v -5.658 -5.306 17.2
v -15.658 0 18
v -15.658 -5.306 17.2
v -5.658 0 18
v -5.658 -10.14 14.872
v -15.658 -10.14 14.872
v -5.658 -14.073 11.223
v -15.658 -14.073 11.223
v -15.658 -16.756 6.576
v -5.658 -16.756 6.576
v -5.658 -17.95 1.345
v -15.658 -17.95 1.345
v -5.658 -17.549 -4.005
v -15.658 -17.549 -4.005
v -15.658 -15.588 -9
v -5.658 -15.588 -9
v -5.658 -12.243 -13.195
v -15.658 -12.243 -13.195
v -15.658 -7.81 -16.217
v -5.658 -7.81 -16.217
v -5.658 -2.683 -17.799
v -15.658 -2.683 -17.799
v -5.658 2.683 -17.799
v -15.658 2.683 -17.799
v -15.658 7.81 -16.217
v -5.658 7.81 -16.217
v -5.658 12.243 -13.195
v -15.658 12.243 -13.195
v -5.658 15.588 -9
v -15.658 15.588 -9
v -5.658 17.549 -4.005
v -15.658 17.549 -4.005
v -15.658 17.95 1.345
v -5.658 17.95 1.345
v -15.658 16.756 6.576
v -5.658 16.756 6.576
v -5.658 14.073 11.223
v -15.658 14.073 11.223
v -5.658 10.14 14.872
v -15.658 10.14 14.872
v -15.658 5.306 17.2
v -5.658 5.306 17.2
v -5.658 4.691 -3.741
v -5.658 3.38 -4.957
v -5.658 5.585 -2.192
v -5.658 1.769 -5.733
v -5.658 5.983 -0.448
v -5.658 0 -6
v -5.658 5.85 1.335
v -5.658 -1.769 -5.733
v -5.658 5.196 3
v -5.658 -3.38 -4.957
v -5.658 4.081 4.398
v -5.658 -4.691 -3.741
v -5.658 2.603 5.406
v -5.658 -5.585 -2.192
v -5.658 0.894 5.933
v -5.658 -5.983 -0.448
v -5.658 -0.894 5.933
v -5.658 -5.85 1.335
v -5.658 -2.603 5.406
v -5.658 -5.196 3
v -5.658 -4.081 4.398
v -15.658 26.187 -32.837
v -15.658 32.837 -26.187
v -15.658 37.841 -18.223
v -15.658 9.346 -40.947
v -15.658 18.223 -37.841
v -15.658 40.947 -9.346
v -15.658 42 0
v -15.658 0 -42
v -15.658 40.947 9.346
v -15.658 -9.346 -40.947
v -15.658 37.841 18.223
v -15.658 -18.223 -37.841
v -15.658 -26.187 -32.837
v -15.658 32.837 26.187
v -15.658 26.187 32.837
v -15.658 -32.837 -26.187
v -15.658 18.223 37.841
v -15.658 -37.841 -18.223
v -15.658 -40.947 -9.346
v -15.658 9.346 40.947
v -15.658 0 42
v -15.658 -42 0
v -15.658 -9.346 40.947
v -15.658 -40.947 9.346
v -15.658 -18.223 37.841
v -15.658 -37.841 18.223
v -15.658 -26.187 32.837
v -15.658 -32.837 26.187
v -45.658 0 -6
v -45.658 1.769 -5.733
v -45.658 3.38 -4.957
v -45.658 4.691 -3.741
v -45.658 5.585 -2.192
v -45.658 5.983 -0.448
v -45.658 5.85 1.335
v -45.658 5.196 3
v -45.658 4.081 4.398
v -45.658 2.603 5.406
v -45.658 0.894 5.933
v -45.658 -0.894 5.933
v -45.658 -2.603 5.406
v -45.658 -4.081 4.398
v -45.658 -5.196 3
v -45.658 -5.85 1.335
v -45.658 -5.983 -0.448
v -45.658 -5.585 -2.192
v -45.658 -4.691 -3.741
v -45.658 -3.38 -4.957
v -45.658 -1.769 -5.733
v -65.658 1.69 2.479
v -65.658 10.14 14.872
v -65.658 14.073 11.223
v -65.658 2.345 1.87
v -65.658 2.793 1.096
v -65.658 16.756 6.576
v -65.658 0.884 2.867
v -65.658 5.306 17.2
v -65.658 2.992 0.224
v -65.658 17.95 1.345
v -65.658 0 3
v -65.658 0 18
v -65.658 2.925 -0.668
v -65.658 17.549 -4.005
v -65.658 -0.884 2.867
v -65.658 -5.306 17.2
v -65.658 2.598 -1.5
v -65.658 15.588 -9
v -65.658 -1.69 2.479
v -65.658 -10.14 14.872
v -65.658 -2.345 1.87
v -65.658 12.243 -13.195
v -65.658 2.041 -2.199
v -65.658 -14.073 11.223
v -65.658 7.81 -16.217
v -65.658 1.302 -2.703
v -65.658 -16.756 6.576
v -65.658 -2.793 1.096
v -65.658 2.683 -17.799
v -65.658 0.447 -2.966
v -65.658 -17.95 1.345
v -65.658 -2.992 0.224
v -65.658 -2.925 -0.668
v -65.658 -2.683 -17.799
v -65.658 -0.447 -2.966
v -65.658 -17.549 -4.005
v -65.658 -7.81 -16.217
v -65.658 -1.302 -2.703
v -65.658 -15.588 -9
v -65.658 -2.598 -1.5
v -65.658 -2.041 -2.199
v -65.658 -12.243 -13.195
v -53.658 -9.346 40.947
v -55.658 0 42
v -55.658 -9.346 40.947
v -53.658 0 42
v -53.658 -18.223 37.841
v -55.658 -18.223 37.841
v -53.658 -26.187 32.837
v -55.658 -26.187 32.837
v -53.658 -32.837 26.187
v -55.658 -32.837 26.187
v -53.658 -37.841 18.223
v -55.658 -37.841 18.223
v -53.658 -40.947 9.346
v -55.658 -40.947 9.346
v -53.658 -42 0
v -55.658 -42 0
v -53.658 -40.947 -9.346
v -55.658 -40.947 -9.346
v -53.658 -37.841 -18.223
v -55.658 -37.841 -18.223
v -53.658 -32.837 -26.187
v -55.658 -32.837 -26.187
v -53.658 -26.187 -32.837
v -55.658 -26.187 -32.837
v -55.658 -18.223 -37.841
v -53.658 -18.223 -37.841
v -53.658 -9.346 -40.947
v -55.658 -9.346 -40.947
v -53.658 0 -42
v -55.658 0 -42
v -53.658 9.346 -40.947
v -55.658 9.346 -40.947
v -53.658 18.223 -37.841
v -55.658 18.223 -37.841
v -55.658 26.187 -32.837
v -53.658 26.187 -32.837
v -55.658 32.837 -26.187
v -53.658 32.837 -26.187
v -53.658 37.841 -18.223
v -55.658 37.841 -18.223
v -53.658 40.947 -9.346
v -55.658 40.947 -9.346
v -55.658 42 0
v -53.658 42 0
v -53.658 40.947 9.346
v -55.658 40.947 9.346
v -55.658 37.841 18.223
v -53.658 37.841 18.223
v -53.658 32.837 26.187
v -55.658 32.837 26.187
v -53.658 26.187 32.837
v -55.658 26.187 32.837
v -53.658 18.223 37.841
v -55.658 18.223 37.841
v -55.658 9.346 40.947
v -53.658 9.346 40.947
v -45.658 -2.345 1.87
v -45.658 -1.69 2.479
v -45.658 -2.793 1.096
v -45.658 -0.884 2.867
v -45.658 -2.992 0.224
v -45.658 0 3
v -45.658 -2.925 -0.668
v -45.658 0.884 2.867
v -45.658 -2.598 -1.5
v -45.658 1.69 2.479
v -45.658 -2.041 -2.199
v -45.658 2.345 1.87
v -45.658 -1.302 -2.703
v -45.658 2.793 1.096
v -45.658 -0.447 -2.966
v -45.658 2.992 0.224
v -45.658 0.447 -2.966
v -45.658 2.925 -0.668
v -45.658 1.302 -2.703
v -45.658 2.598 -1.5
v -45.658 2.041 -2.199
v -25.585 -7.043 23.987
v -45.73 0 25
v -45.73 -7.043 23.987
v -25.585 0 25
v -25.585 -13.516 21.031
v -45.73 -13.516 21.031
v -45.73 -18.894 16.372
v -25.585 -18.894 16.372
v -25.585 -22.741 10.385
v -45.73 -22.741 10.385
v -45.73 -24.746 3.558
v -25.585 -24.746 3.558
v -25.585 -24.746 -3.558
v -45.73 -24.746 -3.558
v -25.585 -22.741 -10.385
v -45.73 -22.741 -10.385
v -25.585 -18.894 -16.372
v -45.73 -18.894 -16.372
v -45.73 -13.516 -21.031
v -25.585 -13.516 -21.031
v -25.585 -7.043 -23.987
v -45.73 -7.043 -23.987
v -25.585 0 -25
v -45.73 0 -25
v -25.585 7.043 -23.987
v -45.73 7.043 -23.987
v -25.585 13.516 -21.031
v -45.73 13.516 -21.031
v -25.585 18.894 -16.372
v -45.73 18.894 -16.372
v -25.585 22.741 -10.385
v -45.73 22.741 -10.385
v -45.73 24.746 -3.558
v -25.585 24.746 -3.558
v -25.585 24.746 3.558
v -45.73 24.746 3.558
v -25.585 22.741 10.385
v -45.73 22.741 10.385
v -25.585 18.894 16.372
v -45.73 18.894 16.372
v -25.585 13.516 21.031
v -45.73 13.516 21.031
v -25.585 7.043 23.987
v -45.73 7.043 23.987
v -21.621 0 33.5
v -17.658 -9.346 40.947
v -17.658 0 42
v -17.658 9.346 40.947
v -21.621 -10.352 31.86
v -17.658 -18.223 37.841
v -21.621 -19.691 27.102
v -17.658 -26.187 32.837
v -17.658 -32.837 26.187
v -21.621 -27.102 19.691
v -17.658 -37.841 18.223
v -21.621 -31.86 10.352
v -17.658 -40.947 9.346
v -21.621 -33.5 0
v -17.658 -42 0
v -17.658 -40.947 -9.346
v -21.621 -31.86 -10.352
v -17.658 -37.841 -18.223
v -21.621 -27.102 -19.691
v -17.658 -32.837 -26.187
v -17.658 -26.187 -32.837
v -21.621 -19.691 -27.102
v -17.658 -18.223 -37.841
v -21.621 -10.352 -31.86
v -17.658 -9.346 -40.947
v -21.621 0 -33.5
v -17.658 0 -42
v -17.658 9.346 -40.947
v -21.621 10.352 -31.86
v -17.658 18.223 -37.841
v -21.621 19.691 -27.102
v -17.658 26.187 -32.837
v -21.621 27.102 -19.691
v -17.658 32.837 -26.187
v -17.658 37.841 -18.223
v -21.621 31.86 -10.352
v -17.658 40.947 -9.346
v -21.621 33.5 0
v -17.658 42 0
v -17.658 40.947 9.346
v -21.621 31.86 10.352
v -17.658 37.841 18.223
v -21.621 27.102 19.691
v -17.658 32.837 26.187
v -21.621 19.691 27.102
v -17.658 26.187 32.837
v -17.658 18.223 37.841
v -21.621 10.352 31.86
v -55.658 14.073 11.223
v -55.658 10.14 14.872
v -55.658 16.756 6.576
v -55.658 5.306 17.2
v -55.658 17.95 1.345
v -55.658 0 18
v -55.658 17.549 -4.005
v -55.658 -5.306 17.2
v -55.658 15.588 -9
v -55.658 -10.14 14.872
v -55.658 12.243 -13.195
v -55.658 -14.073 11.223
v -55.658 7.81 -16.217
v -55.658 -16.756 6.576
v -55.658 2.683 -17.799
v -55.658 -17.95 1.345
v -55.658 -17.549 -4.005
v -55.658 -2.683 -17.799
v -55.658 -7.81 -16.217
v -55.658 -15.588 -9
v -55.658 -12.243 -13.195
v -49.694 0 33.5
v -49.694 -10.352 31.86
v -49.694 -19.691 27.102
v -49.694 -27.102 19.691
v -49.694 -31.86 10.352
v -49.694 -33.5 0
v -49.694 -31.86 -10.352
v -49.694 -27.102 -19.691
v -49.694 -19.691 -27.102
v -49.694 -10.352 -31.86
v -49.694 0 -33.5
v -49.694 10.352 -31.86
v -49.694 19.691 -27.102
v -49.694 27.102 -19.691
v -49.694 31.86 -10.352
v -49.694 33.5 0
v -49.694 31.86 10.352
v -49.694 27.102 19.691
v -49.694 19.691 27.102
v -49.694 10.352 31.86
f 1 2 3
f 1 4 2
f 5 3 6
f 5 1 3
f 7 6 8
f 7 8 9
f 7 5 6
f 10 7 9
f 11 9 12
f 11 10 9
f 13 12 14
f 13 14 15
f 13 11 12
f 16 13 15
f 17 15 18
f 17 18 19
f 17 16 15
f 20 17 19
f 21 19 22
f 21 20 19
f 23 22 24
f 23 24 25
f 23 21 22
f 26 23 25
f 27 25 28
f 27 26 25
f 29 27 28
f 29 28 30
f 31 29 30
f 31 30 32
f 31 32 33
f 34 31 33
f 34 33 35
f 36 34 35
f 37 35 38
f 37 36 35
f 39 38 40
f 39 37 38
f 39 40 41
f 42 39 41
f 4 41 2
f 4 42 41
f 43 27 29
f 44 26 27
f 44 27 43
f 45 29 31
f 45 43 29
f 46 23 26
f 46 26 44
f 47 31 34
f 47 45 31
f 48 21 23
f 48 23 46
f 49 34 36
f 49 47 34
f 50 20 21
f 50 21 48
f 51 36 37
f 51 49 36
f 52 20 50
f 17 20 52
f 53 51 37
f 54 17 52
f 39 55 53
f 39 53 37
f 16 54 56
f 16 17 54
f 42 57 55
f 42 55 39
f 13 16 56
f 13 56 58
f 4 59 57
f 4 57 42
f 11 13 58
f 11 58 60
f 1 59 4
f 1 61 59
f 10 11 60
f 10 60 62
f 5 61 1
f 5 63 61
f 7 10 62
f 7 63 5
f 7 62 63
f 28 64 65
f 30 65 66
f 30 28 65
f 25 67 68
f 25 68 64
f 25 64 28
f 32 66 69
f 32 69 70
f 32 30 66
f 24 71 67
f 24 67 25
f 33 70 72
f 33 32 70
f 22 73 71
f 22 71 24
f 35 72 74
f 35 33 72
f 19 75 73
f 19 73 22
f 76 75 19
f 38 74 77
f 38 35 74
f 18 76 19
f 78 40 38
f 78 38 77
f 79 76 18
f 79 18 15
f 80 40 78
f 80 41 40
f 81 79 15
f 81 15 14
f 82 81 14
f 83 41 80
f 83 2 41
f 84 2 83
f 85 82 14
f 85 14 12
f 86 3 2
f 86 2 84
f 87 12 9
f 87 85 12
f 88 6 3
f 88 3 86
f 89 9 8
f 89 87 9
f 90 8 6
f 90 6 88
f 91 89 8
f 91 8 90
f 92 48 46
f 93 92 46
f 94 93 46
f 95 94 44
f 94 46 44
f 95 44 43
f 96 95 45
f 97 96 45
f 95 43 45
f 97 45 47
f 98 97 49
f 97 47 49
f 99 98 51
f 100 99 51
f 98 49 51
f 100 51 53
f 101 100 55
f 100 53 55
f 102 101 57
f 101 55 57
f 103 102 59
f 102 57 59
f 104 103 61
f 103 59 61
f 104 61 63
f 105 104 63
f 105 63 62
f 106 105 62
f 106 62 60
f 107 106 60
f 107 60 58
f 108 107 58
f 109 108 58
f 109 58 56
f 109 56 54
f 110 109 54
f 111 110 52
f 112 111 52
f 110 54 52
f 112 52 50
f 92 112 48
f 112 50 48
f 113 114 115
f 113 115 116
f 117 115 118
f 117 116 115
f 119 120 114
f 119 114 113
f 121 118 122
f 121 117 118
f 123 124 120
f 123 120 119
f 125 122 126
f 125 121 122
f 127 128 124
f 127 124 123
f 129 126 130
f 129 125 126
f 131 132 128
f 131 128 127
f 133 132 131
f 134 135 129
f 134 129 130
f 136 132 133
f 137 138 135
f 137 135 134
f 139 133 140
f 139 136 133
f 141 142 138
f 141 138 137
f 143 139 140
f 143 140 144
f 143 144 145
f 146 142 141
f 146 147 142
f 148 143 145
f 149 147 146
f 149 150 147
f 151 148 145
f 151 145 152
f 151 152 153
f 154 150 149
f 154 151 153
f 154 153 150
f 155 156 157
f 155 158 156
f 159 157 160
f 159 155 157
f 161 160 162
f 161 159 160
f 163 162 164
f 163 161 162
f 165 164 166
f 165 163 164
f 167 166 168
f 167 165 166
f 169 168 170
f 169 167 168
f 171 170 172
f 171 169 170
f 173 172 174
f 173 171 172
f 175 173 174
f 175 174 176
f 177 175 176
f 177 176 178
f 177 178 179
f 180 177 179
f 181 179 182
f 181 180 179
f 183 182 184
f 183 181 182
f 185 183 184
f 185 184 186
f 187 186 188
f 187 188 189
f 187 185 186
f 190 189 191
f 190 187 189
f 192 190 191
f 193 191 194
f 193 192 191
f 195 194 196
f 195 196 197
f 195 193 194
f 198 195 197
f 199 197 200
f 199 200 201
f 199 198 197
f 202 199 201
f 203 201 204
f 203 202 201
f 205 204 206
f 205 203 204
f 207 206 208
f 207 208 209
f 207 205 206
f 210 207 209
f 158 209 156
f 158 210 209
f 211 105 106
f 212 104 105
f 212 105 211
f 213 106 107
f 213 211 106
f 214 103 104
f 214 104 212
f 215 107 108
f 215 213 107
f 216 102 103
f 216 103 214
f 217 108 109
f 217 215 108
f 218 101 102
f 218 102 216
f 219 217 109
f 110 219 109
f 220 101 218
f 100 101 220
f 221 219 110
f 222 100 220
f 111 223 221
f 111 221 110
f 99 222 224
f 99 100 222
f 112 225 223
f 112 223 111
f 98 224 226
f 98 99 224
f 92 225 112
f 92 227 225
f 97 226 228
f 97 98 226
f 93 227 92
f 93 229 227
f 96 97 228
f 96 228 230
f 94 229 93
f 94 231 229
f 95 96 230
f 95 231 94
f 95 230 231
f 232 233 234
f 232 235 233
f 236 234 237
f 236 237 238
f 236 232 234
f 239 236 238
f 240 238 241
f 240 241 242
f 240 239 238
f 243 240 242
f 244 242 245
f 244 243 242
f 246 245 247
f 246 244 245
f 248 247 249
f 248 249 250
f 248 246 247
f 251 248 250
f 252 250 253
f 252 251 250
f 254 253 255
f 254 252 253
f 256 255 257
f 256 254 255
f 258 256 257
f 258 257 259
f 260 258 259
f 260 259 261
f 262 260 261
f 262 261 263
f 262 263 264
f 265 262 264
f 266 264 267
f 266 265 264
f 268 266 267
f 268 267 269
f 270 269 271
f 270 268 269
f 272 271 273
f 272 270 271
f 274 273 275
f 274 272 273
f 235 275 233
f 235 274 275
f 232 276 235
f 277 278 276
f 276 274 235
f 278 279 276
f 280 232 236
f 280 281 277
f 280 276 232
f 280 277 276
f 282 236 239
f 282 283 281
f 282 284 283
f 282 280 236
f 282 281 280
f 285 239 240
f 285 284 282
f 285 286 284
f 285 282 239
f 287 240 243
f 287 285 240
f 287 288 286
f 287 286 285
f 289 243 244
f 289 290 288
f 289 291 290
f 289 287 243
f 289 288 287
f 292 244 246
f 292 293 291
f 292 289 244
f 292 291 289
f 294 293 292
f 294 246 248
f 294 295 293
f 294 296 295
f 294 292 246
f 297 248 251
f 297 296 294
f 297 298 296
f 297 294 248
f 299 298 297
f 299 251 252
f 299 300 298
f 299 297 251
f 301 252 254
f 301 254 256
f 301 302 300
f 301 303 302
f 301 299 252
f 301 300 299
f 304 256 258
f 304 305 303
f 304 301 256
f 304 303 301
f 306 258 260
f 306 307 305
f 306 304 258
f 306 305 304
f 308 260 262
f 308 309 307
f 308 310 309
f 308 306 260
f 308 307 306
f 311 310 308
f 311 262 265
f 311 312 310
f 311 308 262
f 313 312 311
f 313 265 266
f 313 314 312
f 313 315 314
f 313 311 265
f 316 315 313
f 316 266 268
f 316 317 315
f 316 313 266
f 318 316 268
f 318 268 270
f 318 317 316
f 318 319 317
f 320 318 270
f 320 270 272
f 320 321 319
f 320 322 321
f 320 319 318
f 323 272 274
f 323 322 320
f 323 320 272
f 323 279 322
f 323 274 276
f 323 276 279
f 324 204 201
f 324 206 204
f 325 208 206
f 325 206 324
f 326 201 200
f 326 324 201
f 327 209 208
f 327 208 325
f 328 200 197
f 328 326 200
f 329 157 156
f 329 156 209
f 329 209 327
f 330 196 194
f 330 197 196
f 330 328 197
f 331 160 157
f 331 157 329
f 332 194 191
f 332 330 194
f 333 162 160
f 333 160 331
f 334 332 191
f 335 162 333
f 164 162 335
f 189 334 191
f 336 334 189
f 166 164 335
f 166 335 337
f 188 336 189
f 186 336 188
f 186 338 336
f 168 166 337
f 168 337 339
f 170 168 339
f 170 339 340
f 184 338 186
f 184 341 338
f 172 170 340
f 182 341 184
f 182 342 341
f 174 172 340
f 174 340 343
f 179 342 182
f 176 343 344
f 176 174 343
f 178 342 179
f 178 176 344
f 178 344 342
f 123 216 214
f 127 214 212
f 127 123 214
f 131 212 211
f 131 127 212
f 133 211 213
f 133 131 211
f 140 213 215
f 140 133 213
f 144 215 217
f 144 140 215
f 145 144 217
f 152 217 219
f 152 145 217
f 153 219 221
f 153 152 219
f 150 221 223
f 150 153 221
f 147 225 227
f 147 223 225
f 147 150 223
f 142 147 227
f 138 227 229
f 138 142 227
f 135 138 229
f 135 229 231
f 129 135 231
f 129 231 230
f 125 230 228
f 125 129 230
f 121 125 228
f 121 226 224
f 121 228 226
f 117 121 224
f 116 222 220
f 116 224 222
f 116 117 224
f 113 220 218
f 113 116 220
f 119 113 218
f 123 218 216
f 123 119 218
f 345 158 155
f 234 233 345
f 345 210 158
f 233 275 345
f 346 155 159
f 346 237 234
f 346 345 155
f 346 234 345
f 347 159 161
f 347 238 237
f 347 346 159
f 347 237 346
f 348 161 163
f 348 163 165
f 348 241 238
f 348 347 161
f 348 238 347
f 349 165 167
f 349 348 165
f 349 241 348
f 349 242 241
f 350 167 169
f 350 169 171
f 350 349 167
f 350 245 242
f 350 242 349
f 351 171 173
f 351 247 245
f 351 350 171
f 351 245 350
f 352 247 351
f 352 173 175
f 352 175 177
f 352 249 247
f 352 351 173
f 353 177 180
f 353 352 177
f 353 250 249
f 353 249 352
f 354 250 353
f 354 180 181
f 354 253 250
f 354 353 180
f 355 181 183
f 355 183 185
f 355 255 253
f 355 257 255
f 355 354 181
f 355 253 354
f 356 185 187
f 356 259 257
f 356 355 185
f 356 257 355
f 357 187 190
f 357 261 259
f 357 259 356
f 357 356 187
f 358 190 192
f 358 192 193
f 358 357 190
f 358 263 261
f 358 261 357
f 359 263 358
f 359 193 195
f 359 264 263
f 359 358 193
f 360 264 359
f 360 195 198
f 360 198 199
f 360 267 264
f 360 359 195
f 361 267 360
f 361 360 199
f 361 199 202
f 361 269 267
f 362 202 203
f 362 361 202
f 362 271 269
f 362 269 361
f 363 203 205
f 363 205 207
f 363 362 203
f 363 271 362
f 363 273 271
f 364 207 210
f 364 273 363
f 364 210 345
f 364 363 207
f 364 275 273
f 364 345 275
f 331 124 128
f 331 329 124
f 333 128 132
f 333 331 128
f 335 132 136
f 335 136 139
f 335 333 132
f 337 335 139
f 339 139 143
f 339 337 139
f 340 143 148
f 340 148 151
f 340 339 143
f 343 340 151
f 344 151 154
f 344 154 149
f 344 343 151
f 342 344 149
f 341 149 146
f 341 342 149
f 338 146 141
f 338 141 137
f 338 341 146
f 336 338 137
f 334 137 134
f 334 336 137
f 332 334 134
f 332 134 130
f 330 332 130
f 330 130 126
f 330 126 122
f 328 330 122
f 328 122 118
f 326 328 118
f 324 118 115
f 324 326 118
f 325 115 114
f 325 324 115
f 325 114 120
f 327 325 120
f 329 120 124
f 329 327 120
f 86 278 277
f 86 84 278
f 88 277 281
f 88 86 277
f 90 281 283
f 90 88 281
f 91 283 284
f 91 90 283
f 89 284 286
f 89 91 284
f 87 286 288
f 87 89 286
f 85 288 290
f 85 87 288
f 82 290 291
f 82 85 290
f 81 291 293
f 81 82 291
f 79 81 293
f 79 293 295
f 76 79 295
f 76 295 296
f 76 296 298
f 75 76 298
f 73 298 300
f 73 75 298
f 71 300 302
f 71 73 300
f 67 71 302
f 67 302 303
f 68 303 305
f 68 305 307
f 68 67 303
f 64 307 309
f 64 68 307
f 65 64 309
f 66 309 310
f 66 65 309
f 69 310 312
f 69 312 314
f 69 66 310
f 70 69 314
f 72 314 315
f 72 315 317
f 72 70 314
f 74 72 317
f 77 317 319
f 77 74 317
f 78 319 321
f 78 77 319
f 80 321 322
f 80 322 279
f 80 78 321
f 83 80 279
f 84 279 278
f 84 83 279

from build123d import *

# Parameters (mm, degrees)
ESQUISSE2_R             = 6
ENL_V_MAT_EXTRU_1_DEPTH = 40


with BuildPart() as part:
    # Esquisse1 → Révolution1 (revolve)
    with BuildSketch(Plane.XY, mode=Mode.PRIVATE) as r_volution1_sk:
        Polygon((-55.657677475, 42), (-53.657677475, 42), (-45.730447287, 25), (-25.584907664, 25), (-17.657677475, 42), (-15.657677475, 42), (-15.657677475, 18), (-5.657677475, 18), (-5.657677475, 3), (-65.657677475, 3), (-65.657677475, 18), (-55.657677475, 18), align=None)
    revolve(r_volution1_sk.sketch.rotate(Axis((-128.723358614, 0, 0), (1, 0, 0)), 90), axis=Axis((-128.723358614, 0, 0), (1, 0, 0)))  # turned: the seam where the file's is

    # Esquisse2 → Enlèv. mat.-Extru.1 (cut)
    with BuildSketch(Plane(origin=(-5.657677475, 0, 0), x_dir=(0, 0, -1), z_dir=(1, 0, 0))):
        Circle(ESQUISSE2_R)
    extrude(amount=-ENL_V_MAT_EXTRU_1_DEPTH, mode=Mode.SUBTRACT)


solid = part.part
